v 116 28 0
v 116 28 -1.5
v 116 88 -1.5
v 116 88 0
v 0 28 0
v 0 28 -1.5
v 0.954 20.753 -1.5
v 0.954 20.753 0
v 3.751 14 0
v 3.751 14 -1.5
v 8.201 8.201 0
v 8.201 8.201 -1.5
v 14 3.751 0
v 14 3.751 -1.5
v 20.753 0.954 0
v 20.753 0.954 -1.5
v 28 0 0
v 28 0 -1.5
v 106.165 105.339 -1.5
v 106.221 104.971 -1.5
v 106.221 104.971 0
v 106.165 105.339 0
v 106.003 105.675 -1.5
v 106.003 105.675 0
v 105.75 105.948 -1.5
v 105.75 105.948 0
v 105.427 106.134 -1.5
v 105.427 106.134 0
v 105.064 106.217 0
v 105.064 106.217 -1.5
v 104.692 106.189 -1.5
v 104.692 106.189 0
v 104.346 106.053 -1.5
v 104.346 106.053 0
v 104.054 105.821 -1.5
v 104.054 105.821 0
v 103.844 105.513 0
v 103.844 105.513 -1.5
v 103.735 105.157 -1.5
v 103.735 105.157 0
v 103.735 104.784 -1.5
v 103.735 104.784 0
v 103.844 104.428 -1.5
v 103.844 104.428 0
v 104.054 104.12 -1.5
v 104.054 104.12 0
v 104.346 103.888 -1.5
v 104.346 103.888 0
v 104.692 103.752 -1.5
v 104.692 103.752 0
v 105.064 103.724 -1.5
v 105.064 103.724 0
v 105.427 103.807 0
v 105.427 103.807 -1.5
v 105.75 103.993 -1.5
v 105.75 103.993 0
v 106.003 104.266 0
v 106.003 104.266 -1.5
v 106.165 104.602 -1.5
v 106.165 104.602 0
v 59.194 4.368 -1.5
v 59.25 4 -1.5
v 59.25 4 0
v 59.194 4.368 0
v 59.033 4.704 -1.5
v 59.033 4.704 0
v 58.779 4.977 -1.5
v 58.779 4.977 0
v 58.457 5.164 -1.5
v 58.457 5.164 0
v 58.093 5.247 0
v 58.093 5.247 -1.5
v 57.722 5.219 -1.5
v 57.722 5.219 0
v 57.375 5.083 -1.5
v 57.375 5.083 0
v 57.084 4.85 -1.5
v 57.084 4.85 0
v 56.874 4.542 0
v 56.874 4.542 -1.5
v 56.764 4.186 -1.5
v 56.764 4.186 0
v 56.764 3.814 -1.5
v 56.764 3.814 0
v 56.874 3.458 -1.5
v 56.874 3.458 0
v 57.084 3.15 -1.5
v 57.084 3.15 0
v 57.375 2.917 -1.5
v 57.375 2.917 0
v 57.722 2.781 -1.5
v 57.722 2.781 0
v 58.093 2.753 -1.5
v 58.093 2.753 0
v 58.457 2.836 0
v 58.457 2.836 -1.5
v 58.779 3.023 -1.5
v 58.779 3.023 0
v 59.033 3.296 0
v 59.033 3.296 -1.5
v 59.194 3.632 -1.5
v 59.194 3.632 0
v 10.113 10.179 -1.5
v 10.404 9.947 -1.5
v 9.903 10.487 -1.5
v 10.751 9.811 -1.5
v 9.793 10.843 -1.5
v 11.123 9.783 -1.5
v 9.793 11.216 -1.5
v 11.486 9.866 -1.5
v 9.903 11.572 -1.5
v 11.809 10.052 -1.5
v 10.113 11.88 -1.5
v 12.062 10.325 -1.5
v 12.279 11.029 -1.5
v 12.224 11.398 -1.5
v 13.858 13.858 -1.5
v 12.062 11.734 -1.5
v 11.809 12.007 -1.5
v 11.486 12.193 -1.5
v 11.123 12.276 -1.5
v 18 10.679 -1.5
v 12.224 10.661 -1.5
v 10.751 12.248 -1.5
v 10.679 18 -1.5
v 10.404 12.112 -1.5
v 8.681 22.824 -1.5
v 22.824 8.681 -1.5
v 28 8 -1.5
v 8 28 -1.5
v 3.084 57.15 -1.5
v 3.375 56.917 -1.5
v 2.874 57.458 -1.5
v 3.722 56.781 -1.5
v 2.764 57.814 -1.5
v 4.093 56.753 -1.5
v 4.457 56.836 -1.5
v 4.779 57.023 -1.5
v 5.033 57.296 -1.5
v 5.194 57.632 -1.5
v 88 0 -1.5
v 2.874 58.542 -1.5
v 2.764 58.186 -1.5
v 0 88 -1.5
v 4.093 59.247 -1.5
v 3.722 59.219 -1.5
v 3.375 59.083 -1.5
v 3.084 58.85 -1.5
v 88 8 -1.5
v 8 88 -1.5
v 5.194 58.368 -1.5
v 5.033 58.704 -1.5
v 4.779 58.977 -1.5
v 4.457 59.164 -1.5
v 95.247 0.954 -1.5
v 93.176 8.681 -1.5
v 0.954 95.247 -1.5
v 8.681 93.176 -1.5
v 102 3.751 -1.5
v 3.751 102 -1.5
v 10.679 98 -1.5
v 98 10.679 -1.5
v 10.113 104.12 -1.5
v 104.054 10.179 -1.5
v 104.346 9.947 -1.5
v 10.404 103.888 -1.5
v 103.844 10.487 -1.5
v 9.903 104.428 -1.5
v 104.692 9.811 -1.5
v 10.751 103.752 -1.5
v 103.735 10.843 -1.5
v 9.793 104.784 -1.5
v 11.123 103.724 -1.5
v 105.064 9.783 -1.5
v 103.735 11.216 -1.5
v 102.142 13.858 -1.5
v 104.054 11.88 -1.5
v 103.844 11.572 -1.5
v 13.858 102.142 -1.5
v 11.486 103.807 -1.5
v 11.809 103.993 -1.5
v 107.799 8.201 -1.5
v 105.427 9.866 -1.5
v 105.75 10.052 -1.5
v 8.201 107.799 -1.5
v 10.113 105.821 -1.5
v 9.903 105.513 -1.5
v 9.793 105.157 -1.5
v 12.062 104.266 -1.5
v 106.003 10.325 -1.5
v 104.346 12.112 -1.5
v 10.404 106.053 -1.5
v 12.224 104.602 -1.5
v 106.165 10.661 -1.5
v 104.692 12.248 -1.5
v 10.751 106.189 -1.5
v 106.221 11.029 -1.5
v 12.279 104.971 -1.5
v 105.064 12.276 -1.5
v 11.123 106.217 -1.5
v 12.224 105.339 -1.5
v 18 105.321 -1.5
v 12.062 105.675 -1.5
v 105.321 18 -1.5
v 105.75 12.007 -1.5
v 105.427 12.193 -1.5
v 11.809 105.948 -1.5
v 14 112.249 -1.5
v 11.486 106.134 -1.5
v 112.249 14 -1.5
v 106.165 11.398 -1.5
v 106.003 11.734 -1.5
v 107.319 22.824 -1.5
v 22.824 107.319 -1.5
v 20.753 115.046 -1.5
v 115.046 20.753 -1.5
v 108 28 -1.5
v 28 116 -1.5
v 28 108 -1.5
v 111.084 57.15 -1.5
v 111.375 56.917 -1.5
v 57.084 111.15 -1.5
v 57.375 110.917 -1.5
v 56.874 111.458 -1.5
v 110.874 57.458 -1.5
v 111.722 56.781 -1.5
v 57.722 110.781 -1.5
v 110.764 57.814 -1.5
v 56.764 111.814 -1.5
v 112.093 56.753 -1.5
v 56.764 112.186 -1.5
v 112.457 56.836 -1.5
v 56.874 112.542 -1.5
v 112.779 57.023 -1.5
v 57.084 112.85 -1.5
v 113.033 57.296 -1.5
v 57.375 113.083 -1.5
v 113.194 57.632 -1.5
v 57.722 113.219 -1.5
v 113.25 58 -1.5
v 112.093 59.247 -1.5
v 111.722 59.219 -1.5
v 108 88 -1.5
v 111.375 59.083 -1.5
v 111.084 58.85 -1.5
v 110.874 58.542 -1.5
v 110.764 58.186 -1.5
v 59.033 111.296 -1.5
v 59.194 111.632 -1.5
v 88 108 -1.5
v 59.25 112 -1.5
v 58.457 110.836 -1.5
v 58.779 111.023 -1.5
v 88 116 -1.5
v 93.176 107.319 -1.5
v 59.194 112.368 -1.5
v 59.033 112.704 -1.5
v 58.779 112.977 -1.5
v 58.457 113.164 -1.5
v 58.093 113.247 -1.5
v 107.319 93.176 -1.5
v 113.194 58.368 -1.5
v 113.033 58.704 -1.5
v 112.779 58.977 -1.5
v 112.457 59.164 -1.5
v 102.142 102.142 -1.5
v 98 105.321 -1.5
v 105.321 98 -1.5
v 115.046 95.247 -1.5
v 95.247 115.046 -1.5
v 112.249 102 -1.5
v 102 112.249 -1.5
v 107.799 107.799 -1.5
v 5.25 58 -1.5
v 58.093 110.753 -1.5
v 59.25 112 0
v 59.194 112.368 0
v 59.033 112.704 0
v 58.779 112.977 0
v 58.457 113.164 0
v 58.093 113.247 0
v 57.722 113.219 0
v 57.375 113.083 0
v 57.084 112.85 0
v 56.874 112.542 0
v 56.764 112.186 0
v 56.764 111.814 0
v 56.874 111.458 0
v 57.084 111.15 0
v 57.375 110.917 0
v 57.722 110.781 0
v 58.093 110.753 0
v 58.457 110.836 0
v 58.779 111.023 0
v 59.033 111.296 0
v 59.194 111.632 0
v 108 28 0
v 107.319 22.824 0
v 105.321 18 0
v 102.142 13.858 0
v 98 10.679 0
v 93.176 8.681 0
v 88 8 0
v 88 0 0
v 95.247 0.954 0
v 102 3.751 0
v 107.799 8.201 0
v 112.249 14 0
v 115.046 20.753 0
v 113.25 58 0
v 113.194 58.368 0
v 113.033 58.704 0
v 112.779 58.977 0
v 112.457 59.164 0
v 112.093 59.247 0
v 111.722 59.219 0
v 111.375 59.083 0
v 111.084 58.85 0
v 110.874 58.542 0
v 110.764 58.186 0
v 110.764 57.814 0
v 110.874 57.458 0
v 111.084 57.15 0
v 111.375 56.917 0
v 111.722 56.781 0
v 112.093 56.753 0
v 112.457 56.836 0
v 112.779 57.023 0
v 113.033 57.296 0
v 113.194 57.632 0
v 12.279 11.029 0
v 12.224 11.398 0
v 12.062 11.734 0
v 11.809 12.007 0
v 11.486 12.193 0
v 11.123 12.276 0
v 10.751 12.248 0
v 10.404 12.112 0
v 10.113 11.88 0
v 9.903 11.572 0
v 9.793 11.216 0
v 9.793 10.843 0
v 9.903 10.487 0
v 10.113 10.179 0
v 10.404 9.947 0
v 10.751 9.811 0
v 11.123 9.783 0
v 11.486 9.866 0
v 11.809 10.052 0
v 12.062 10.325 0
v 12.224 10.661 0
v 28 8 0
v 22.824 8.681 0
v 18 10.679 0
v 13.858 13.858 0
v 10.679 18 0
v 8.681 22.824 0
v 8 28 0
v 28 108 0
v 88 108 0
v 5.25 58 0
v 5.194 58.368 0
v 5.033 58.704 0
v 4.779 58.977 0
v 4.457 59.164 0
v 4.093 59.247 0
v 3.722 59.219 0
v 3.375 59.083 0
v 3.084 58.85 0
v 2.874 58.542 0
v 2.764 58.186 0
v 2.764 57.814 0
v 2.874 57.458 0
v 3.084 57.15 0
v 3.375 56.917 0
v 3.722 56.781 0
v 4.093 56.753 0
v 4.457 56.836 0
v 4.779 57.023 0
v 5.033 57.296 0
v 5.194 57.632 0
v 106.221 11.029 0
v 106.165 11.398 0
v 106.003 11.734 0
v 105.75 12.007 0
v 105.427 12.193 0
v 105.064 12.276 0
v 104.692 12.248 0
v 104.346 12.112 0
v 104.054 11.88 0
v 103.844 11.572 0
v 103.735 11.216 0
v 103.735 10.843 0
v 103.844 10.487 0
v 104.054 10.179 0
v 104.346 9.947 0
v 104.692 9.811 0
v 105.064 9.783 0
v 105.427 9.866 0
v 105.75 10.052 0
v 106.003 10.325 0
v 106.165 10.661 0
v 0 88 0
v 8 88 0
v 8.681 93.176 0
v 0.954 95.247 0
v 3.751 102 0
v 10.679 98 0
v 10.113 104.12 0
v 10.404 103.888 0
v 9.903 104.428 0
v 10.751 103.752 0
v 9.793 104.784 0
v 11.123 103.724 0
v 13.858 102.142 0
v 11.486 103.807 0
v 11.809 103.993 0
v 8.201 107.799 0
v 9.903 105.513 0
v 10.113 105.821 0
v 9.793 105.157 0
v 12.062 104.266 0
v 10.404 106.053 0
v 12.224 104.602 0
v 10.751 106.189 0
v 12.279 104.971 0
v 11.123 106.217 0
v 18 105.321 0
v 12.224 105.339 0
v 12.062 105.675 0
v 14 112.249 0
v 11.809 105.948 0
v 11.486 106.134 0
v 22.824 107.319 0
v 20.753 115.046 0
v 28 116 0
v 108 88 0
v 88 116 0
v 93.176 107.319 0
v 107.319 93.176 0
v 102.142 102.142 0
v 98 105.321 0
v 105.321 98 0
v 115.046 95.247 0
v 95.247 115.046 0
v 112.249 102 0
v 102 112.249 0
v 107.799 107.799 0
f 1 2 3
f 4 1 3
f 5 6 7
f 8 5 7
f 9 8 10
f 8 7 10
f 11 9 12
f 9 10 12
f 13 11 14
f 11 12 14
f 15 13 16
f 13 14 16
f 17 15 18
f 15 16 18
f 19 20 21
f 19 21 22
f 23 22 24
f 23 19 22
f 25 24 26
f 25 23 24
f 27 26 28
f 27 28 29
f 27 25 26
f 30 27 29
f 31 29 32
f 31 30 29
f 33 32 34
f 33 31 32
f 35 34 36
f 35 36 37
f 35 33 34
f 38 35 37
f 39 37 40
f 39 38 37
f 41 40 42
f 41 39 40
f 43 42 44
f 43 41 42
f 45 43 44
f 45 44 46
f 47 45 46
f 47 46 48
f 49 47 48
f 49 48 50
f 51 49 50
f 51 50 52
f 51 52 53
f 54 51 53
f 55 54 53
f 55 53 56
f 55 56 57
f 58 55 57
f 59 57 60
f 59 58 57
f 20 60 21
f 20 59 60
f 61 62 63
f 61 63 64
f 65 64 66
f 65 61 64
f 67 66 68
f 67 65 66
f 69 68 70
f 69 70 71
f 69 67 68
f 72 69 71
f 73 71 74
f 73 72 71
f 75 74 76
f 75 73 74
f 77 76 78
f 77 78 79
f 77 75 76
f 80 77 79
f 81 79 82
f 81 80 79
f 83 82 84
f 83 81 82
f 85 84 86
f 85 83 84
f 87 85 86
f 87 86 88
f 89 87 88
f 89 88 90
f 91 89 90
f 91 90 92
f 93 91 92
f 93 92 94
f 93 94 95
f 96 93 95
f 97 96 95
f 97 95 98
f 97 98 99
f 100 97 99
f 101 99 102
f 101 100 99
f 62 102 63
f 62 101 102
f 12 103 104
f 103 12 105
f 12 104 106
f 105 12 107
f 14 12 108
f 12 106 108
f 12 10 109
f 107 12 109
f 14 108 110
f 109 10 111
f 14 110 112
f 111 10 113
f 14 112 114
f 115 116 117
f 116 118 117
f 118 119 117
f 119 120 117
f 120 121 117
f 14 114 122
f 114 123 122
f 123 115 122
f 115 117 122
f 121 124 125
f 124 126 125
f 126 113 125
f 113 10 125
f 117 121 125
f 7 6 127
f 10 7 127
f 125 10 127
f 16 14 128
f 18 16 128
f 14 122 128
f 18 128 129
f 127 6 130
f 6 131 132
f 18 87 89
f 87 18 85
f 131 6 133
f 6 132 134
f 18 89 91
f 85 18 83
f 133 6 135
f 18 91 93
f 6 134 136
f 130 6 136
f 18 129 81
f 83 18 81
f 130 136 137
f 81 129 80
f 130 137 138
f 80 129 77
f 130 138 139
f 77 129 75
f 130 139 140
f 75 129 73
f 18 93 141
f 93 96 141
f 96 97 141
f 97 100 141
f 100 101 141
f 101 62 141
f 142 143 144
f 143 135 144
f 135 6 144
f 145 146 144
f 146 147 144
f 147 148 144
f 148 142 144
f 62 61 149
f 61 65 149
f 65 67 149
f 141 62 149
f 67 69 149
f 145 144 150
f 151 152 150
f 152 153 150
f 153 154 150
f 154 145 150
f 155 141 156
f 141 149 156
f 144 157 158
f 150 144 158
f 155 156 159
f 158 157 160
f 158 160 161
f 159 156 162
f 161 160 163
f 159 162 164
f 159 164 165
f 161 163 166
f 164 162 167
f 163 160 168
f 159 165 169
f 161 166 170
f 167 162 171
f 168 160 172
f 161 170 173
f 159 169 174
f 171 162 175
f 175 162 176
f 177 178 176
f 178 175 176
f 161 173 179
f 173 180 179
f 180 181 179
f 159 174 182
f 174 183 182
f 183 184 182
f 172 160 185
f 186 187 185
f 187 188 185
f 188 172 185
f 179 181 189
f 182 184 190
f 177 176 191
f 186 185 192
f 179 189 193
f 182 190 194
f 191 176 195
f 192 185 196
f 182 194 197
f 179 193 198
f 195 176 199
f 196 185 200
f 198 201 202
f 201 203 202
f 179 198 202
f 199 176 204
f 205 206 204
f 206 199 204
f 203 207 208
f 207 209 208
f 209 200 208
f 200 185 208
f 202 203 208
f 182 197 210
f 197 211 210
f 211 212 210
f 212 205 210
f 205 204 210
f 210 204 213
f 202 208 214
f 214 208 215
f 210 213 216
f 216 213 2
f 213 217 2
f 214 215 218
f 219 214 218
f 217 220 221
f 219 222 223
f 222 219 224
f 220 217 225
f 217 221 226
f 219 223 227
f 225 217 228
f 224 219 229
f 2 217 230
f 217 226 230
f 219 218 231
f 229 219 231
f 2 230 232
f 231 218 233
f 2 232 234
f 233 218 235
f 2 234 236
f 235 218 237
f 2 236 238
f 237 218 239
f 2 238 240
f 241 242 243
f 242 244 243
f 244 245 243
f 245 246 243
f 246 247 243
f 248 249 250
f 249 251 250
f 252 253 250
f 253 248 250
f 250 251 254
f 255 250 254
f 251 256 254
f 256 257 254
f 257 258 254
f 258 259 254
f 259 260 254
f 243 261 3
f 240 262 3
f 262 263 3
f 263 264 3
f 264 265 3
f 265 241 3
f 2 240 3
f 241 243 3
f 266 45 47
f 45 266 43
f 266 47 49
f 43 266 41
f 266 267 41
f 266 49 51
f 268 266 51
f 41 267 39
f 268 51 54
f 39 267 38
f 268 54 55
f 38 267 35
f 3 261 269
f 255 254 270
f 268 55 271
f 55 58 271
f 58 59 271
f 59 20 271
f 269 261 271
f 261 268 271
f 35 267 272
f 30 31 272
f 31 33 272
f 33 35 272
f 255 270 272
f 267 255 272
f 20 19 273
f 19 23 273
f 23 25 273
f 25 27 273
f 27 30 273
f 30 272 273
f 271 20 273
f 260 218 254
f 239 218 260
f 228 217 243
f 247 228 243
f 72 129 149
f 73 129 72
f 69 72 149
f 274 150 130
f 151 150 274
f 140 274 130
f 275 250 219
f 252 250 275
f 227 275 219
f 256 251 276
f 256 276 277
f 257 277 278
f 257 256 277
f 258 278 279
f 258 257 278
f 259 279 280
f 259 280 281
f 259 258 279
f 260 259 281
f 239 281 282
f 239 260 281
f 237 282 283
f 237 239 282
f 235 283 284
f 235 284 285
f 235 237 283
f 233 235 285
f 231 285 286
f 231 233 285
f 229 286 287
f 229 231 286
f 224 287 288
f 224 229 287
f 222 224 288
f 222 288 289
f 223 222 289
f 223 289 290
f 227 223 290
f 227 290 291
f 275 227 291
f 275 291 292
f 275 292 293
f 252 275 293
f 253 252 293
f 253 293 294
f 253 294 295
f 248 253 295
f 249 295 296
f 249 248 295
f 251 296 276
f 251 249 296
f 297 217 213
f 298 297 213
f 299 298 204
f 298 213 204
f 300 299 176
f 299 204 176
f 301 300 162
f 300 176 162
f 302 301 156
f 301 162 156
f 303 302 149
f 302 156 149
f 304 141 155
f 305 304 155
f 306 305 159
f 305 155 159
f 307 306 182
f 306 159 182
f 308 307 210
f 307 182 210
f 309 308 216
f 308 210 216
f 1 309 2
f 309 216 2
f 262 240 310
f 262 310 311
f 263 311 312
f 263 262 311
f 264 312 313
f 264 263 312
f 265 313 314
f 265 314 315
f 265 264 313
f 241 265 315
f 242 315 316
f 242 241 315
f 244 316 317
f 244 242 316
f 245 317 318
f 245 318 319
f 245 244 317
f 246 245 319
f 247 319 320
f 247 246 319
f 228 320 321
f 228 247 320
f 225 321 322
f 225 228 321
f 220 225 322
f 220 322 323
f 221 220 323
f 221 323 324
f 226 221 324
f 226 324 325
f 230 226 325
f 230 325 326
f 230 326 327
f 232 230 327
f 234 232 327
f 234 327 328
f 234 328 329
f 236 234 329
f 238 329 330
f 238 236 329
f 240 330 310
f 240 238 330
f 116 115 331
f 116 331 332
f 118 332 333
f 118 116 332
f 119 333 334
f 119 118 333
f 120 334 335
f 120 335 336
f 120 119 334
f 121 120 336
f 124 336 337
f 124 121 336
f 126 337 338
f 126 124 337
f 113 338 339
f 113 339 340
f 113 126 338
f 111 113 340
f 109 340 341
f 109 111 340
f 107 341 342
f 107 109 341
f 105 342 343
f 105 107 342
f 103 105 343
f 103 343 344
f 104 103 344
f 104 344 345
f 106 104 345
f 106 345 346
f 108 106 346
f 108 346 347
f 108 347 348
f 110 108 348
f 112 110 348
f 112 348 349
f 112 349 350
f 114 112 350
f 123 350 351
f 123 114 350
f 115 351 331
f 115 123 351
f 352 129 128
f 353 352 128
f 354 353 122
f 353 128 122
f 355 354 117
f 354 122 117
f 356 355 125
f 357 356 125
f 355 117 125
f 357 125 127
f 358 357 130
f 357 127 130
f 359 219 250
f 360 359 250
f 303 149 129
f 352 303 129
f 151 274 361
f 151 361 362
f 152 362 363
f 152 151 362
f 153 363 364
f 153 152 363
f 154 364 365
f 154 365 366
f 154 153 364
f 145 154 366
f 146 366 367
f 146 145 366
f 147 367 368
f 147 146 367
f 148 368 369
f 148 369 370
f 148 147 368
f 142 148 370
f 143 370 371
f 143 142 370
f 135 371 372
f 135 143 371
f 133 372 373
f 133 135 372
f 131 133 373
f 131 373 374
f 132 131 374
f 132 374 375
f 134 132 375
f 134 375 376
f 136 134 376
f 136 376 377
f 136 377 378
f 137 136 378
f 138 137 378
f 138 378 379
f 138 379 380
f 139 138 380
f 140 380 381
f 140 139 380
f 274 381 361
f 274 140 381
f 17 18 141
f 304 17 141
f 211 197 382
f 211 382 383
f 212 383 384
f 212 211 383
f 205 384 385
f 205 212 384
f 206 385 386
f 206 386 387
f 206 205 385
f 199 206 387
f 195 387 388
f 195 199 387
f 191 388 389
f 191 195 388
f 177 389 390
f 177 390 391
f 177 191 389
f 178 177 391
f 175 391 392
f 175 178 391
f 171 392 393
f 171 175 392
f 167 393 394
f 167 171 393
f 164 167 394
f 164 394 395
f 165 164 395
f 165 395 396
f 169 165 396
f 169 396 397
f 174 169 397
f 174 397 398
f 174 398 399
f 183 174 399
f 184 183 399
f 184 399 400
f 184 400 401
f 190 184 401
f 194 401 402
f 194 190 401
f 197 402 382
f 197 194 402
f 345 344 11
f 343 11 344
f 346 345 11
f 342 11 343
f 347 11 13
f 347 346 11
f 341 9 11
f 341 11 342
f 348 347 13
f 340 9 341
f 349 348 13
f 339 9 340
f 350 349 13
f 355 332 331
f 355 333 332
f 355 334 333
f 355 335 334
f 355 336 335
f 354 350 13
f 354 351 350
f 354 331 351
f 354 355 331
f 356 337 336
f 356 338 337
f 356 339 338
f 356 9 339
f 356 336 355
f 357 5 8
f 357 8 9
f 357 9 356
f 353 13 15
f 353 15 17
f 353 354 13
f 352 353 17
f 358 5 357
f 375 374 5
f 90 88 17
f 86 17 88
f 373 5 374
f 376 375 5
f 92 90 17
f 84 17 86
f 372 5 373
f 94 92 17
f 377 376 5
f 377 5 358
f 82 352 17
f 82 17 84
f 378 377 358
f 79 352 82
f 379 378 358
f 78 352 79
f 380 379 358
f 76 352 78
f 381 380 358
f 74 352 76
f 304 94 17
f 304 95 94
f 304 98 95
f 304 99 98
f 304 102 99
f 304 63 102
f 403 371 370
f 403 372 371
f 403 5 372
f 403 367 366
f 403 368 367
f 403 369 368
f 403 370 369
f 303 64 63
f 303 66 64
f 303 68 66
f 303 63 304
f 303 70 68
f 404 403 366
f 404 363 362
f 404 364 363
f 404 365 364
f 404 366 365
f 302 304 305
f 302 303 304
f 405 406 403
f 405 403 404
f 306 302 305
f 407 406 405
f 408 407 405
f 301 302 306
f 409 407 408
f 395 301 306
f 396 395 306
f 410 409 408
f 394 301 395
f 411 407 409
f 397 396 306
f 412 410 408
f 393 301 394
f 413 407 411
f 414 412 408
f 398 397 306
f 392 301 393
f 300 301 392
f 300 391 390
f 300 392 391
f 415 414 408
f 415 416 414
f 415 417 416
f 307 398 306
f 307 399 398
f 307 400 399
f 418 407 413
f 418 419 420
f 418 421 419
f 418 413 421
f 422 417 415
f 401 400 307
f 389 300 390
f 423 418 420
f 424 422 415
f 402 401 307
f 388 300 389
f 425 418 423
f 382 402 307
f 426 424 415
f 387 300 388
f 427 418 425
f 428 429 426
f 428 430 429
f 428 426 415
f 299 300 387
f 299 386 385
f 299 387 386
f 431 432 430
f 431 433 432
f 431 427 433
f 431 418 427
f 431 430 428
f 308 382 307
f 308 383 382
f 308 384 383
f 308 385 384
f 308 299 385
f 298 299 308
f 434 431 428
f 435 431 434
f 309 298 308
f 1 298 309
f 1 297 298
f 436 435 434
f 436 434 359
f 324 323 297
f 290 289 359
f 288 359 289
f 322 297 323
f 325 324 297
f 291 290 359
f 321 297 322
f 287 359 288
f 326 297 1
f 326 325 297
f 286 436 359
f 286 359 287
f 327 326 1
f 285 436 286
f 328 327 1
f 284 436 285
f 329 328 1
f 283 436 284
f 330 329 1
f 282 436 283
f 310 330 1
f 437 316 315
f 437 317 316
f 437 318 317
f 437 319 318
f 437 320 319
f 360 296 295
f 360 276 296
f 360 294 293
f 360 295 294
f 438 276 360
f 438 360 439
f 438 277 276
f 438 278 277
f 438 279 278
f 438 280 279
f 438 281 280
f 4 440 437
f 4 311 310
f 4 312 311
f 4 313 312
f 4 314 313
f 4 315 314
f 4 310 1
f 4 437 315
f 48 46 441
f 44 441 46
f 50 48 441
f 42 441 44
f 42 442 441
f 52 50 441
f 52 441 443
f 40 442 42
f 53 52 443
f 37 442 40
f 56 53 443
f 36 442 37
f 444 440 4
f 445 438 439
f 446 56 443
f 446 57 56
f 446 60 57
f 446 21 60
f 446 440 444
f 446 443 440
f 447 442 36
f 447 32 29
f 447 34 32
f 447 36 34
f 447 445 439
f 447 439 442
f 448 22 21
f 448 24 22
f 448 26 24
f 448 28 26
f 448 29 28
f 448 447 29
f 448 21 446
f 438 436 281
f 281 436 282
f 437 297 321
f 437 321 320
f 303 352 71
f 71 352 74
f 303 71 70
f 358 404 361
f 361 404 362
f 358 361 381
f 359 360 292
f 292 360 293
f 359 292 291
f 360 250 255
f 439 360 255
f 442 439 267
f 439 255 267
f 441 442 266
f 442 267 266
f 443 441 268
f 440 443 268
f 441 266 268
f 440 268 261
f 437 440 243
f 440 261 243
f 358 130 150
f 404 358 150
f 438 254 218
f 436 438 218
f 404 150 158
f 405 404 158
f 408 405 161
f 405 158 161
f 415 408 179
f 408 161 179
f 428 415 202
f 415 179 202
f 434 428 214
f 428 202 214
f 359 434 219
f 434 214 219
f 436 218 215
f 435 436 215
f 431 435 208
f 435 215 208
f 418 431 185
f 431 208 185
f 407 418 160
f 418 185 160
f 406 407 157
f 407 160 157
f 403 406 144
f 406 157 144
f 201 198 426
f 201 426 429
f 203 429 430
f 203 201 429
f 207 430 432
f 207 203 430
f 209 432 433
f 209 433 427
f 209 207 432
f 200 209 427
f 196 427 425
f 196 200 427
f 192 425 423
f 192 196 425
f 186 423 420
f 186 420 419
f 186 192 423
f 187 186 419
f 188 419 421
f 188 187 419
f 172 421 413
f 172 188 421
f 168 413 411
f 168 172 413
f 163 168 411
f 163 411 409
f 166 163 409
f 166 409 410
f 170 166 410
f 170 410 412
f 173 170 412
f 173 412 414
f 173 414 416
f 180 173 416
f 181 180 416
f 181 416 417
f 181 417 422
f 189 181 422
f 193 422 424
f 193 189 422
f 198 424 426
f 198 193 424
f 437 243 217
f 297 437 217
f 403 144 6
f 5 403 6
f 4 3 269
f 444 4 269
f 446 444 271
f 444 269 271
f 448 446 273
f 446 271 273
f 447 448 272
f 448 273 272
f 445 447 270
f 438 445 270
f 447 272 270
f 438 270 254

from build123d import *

# Parameters (mm, degrees)
CONVERT_SOLID1_START     = -1.5
CONVERT_SOLID1_OUTLINE_R = 1.25
CONVERT_SOLID1_DEPTH     = 1.5


# Read off the part's stored shape, not the designer's step: Convert-Solid1
with BuildPart() as part:
    # Convert-Solid1 outline → Convert-Solid1 (new body)
    with BuildSketch(Plane.XY.offset(CONVERT_SOLID1_START)):
        with BuildLine():
            Line((116, 28), (116, 88))
            ThreePointArc((116, 88), (107.798989873, 107.798989873), (88, 116))
            Line((88, 116), (28, 116))
            ThreePointArc((28, 116), (8.201010127, 107.798989873), (0, 88))
            Line((0, 88), (0, 28))
            ThreePointArc((0, 28), (8.201010127, 8.201010127), (28, 0))
            Line((28, 0), (88, 0))
            ThreePointArc((88, 0), (107.798989873, 8.201010127), (116, 28))
        make_face()
        with Locations((11.029437252, 11.029437252)):
            Circle(CONVERT_SOLID1_OUTLINE_R, mode=Mode.SUBTRACT)
        with Locations((58, 4)):
            Circle(CONVERT_SOLID1_OUTLINE_R, mode=Mode.SUBTRACT)
        with Locations((104.970562748, 11.029437252)):
            Circle(CONVERT_SOLID1_OUTLINE_R, mode=Mode.SUBTRACT)
        with Locations((4, 58)):
            Circle(CONVERT_SOLID1_OUTLINE_R, mode=Mode.SUBTRACT)
        with Locations((11.029437252, 104.970562748)):
            Circle(CONVERT_SOLID1_OUTLINE_R, mode=Mode.SUBTRACT)
        with BuildLine():
            ThreePointArc((108, 28), (102.142135624, 13.857864376), (88, 8))
            Line((88, 8), (28, 8))
            ThreePointArc((28, 8), (13.857864376, 13.857864376), (8, 28))
            Line((8, 28), (8, 88))
            ThreePointArc((8, 88), (13.857864376, 102.142135624), (28, 108))
            Line((28, 108), (88, 108))
            ThreePointArc((88, 108), (102.142135624, 102.142135624), (108, 88))
            Line((108, 88), (108, 28))
        make_face(mode=Mode.SUBTRACT)
        with Locations((112, 58)):
            Circle(CONVERT_SOLID1_OUTLINE_R, mode=Mode.SUBTRACT)
        with Locations((58, 112)):
            Circle(CONVERT_SOLID1_OUTLINE_R, mode=Mode.SUBTRACT)
        with Locations((104.970562748, 104.970562748)):
            Circle(CONVERT_SOLID1_OUTLINE_R, mode=Mode.SUBTRACT)
    extrude(amount=CONVERT_SOLID1_DEPTH)


solid = part.part
